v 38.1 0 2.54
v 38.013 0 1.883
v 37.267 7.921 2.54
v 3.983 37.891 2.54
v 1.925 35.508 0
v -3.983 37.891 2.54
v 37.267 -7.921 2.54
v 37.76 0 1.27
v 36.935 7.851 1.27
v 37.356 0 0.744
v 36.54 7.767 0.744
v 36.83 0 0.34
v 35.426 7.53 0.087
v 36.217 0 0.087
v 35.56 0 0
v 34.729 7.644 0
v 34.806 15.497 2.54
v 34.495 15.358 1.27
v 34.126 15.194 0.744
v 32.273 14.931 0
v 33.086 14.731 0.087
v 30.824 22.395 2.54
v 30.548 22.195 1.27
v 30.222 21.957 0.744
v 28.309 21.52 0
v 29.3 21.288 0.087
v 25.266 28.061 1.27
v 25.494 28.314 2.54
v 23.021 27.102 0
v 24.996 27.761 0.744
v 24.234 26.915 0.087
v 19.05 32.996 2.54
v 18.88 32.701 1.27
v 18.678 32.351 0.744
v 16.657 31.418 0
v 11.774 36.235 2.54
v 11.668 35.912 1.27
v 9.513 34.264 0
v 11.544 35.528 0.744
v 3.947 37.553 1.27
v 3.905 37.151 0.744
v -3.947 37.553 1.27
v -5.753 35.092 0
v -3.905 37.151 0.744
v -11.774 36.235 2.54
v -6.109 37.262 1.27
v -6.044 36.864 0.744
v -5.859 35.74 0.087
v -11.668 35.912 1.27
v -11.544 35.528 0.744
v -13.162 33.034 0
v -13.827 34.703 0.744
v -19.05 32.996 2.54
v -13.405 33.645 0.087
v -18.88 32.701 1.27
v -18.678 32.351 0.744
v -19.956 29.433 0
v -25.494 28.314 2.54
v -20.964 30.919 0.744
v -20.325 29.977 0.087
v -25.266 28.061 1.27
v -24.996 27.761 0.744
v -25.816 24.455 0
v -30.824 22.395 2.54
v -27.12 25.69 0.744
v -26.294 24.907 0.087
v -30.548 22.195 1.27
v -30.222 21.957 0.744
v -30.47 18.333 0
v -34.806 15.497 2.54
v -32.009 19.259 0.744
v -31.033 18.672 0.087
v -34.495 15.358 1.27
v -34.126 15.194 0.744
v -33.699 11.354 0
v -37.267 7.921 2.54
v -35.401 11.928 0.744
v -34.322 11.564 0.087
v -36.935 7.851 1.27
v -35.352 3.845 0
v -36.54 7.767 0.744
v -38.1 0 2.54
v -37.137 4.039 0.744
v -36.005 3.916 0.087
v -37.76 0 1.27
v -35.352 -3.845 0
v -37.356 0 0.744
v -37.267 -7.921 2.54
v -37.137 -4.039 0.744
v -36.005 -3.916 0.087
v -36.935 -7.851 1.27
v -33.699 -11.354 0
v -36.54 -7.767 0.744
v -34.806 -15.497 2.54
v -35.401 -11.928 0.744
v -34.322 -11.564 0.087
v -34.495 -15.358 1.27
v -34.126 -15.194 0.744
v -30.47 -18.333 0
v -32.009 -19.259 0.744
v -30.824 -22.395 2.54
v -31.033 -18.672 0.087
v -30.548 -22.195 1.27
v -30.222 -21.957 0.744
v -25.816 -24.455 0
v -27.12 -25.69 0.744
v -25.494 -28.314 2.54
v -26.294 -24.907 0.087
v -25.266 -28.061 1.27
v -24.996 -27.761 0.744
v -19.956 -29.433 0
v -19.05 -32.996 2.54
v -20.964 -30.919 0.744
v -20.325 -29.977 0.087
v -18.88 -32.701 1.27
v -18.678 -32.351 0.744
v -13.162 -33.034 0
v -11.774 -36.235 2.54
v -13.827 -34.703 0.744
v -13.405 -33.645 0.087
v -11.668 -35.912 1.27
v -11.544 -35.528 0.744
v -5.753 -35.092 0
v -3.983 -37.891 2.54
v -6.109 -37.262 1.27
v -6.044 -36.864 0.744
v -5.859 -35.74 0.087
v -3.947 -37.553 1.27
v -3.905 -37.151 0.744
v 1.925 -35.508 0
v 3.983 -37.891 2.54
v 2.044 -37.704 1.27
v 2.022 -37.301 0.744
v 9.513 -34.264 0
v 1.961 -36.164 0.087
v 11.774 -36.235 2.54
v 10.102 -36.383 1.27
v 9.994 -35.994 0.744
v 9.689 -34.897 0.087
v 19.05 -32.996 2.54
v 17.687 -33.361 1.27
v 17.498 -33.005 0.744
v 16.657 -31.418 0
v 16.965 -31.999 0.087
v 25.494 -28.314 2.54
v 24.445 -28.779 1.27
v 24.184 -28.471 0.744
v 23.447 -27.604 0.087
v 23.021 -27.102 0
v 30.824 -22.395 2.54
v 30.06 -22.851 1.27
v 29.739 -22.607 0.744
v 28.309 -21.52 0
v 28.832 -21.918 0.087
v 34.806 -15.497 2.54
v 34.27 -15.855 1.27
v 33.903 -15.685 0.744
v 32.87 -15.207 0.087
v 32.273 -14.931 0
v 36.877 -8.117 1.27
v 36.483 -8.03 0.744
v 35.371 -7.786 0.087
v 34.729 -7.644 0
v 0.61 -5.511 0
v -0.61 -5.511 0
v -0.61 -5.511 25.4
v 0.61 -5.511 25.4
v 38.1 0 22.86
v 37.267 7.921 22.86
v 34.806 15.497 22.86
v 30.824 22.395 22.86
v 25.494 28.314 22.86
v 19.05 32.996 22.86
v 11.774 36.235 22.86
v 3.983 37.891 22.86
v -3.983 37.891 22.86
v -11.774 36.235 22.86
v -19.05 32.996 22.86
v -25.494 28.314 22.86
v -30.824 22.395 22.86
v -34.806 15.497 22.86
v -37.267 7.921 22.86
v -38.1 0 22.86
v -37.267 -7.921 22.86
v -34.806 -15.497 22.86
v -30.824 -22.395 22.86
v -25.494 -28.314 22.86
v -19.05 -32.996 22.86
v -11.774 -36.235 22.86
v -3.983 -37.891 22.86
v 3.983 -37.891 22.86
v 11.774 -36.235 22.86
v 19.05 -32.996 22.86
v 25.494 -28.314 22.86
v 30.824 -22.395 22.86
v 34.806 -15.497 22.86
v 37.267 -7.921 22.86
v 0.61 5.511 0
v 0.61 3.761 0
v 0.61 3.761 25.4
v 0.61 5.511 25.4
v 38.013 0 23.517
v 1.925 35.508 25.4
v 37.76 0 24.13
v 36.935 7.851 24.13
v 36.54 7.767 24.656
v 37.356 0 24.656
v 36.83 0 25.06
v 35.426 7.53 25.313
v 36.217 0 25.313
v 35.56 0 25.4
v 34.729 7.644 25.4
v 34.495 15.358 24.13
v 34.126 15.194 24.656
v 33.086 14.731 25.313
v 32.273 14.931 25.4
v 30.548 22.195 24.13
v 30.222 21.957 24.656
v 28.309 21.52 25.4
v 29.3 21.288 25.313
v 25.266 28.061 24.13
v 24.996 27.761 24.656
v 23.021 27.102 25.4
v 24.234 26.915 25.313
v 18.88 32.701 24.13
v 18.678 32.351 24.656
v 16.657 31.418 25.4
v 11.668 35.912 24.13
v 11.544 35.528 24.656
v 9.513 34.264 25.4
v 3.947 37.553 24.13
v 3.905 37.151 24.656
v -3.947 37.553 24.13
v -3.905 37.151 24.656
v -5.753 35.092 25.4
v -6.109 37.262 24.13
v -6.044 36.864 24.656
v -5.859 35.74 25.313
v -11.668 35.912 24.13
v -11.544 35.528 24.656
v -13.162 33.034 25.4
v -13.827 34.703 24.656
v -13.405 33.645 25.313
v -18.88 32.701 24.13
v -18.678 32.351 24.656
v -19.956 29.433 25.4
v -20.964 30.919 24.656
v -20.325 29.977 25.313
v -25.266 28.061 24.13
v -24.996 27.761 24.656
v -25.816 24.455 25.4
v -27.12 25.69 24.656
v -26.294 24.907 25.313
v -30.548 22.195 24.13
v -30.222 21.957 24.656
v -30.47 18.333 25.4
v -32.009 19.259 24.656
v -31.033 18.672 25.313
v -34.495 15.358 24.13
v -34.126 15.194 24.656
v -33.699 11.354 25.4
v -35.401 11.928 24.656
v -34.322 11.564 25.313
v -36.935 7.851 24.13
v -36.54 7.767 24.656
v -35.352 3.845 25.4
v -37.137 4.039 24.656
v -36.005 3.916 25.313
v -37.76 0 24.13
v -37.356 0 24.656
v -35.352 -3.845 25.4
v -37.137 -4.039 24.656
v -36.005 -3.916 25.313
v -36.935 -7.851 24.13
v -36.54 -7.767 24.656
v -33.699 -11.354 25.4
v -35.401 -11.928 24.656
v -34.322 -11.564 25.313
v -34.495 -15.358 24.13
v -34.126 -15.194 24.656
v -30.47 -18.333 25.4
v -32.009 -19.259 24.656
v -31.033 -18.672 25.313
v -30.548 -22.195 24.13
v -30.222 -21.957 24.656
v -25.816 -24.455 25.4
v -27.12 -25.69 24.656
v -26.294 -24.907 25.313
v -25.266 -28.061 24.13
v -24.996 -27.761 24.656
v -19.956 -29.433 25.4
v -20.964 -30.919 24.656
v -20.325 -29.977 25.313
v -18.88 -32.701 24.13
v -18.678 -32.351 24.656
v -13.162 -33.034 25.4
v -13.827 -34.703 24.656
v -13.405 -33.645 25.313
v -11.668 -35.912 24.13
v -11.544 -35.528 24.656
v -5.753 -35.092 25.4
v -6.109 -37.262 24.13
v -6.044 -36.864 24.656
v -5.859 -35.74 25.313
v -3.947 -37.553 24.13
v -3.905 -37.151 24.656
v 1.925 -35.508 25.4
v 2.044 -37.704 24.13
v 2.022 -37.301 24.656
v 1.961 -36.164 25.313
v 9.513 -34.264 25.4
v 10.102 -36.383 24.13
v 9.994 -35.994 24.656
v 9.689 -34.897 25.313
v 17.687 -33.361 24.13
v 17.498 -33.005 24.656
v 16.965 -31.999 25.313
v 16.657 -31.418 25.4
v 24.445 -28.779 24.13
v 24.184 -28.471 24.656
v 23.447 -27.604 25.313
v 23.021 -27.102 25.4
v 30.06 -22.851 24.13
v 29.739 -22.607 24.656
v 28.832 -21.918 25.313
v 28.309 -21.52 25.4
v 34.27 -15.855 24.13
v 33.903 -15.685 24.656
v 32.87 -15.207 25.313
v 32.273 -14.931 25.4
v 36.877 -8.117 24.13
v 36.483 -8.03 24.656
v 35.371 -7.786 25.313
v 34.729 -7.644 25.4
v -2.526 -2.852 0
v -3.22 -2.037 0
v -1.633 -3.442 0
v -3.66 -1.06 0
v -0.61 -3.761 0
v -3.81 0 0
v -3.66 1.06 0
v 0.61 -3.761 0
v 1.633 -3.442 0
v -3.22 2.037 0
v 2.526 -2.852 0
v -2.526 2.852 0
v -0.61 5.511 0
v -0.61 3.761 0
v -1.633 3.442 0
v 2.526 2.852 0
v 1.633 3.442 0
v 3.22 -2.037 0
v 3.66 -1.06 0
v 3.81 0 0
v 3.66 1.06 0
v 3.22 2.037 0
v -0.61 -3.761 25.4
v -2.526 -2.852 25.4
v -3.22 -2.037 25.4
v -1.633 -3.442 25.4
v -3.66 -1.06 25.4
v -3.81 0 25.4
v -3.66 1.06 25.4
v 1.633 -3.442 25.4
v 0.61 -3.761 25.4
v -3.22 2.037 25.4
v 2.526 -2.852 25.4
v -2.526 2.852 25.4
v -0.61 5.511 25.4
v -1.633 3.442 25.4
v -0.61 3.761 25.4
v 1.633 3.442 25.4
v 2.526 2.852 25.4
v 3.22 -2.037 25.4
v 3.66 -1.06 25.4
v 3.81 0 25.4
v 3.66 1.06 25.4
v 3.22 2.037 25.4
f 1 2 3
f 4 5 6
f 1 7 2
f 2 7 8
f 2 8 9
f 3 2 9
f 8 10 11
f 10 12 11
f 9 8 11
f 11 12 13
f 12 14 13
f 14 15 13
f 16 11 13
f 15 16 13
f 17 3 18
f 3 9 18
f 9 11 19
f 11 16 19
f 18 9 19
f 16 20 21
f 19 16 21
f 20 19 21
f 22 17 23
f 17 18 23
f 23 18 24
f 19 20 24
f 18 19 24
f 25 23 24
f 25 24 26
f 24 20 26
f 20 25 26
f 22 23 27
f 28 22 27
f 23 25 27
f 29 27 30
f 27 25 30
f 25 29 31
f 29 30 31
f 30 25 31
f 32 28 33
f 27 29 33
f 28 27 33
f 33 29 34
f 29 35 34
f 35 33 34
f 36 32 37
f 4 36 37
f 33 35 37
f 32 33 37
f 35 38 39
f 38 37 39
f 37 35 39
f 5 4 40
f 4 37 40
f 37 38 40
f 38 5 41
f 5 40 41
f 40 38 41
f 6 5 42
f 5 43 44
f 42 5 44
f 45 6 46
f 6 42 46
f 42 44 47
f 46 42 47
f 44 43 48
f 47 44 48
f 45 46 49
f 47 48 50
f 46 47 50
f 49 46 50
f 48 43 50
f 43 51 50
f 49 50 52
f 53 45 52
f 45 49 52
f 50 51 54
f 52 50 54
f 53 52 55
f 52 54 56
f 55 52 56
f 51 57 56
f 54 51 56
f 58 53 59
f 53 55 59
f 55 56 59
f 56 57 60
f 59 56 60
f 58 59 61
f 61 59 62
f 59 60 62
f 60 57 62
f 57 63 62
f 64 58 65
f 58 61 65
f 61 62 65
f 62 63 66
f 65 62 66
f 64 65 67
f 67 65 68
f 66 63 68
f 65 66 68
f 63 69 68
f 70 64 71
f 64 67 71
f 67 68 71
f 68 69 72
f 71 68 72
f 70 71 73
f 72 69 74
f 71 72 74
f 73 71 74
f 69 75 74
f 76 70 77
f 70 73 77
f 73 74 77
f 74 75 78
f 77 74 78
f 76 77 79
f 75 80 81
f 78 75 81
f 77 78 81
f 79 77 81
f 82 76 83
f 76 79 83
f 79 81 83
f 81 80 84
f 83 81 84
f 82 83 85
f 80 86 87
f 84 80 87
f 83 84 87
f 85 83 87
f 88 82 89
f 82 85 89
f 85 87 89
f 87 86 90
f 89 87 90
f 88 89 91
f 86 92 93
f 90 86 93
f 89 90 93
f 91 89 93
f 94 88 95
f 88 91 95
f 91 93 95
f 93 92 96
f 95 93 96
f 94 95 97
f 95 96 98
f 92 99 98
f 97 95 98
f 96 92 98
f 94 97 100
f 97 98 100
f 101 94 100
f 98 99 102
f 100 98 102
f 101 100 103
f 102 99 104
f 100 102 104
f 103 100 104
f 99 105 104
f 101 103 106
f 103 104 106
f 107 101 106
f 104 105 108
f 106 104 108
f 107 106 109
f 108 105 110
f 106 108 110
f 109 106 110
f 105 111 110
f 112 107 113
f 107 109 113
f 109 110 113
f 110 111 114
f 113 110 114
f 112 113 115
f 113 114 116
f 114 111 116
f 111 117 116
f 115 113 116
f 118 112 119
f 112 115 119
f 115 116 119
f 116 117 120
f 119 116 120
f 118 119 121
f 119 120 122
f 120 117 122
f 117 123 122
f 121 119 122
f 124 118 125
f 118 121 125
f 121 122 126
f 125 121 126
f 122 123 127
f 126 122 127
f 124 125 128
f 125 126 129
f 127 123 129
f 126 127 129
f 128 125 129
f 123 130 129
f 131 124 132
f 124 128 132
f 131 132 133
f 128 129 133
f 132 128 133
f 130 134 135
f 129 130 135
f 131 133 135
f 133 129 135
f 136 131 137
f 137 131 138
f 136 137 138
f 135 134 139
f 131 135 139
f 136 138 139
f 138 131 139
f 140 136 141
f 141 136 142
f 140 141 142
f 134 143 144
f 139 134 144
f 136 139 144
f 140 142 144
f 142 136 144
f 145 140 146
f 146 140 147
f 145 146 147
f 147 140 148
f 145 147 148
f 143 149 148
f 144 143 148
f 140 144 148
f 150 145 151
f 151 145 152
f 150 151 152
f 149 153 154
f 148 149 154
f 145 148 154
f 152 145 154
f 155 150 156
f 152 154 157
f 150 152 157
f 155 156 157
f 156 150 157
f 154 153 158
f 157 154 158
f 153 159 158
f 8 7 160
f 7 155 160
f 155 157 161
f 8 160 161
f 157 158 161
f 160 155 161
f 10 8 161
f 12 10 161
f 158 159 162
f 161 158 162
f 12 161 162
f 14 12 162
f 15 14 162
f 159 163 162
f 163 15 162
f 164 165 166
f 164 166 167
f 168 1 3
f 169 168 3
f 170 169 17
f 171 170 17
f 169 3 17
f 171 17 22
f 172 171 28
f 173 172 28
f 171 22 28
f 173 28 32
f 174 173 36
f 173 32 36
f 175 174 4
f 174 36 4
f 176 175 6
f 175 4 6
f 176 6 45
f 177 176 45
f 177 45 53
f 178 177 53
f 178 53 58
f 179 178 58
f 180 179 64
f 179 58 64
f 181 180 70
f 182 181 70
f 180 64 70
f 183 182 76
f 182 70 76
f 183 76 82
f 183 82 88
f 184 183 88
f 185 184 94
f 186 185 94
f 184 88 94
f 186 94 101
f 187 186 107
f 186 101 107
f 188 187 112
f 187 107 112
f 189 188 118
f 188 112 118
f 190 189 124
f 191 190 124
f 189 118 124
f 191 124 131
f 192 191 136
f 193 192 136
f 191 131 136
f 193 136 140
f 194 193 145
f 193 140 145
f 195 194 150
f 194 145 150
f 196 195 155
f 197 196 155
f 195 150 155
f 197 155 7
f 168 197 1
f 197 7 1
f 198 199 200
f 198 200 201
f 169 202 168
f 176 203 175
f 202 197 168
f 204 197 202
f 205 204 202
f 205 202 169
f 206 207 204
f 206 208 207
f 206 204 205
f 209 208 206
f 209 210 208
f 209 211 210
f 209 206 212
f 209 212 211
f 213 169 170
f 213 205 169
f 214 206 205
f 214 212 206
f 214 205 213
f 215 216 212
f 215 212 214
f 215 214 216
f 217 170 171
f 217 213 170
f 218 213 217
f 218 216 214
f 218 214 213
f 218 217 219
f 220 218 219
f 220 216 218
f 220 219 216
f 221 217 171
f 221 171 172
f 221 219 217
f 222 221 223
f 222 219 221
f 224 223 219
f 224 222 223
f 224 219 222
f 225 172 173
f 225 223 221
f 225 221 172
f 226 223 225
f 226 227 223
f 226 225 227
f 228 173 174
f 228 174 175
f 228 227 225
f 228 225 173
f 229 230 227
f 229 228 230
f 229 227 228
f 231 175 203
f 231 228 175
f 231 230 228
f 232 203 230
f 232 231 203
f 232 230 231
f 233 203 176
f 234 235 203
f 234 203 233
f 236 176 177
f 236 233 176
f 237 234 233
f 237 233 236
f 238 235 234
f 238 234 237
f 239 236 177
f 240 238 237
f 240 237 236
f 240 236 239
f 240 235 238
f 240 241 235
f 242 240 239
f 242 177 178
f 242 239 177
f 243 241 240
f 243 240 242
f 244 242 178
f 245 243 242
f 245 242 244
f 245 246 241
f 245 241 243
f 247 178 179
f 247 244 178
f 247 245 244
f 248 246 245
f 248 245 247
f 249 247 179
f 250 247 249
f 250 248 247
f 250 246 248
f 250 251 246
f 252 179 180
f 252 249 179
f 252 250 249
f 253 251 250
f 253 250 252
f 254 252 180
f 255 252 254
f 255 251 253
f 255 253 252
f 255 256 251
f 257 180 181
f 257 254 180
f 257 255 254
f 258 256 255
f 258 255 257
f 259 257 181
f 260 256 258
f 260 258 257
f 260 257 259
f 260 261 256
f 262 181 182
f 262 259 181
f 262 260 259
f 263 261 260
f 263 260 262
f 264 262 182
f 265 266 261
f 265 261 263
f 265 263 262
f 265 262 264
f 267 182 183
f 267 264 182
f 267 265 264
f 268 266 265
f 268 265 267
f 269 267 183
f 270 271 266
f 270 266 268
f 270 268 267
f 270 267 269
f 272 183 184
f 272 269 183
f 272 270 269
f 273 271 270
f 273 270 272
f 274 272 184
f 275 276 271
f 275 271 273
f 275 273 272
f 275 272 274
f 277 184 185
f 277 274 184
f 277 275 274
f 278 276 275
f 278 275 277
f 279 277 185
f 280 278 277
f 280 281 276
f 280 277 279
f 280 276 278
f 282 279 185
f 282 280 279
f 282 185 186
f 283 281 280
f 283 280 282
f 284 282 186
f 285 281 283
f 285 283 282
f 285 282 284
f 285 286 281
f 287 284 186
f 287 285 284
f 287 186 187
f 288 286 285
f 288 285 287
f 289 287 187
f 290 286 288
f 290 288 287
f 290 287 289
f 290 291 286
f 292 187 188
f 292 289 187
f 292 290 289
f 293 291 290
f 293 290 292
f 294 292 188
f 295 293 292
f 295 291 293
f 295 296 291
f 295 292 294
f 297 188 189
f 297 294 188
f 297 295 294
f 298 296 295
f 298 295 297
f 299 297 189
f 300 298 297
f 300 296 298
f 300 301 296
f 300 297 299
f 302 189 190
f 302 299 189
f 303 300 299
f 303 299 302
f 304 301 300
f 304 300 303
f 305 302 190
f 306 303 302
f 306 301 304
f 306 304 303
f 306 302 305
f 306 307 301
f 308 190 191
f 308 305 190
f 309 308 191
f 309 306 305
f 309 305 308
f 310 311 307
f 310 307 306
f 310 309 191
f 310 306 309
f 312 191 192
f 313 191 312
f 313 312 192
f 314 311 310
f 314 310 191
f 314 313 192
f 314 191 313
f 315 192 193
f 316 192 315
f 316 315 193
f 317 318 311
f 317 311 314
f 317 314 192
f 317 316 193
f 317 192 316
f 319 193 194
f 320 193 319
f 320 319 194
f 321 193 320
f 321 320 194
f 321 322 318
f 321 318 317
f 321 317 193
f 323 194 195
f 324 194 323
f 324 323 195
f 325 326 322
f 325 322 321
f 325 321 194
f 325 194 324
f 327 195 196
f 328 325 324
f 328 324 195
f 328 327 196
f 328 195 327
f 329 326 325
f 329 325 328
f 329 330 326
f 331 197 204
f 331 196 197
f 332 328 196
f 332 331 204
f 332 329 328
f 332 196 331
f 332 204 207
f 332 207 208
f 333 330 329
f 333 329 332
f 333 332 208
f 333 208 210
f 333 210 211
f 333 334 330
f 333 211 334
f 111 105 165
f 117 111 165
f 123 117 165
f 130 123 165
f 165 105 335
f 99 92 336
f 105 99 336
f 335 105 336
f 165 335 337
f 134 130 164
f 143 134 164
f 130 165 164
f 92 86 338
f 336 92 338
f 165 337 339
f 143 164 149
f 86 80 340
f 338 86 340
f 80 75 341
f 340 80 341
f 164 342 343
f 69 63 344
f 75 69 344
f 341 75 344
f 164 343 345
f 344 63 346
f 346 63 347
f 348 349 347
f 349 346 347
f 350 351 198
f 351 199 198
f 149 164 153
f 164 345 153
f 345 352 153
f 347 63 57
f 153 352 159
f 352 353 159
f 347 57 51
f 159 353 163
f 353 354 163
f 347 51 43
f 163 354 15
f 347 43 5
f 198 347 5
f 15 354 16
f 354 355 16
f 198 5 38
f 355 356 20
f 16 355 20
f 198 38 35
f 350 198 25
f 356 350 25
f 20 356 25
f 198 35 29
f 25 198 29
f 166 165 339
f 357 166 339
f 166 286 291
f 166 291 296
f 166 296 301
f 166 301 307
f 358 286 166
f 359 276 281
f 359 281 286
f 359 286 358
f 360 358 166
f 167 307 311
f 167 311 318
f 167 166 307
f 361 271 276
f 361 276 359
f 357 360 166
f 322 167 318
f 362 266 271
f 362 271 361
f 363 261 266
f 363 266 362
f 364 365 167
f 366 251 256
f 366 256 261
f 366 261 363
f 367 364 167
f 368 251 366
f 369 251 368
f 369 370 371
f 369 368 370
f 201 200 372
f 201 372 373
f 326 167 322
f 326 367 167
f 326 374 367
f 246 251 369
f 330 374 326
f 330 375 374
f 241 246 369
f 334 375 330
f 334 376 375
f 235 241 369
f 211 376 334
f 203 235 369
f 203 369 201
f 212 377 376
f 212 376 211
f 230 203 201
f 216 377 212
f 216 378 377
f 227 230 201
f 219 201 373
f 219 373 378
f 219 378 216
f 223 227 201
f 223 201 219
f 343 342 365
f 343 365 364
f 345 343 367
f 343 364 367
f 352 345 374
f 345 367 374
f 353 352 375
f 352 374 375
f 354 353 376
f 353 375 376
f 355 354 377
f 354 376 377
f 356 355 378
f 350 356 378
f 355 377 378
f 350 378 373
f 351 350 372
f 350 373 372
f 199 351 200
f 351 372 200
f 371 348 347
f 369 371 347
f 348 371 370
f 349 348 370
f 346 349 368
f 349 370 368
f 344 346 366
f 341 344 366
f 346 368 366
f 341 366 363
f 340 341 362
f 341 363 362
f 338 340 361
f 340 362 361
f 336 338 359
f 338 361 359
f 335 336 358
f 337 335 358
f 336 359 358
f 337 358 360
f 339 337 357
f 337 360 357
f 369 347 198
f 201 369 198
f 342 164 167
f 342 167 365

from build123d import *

# Parameters (mm, degrees)
SKETCH1_R           = 38.1
BOSS_EXTRUDE1_DEPTH = 25.4
CUT_EXTRUDE1_REACH  = 61.568
SKETCH2_R           = 3.81
FILLET1_R           = 2.54
FILLET2_R           = 2.54
CUT_EXTRUDE2_START  = -25.4
SKETCH3_W           = 1.220415144
SKETCH3_H           = 11.022652864
CUT_EXTRUDE2_DEPTH  = 25.4


with BuildPart() as part:
    # Sketch1 → Boss-Extrude1 (new body)
    with BuildSketch(Plane.XY):
        Circle(SKETCH1_R)
    extrude(amount=BOSS_EXTRUDE1_DEPTH)

    # Sketch2 → Cut-Extrude1 (cut, up to next)
    with BuildSketch(Plane.XY.offset(25.4), mode=Mode.PRIVATE) as cut_extrude1_sk1:
        Circle(SKETCH2_R)
    cut_extrude1_tool1 = extrude(cut_extrude1_sk1.sketch, amount=-CUT_EXTRUDE1_REACH, mode=Mode.PRIVATE) & part.part
    add(cut_extrude1_tool1.solids().sort_by_distance((0, 0, 25.4))[0], mode=Mode.SUBTRACT)

    # Fillet1
    fillet1_edges = [part.edges().sort_by_distance(p)[0] for p in [
        (-38.1, 0, 25.4),
    ]]
    fillet(fillet1_edges, radius=FILLET1_R)

    # Fillet2
    fillet2_edges = [part.edges().sort_by_distance(p)[0] for p in [
        (-38.1, 0, 0),
    ]]
    fillet(fillet2_edges, radius=FILLET2_R)

    # Sketch3 → Cut-Extrude2 (cut)
    with BuildSketch(Plane.XY.offset(25.4).offset(CUT_EXTRUDE2_START)):
        Rectangle(SKETCH3_W, SKETCH3_H)
    extrude(amount=CUT_EXTRUDE2_DEPTH, mode=Mode.SUBTRACT)


solid = part.part
